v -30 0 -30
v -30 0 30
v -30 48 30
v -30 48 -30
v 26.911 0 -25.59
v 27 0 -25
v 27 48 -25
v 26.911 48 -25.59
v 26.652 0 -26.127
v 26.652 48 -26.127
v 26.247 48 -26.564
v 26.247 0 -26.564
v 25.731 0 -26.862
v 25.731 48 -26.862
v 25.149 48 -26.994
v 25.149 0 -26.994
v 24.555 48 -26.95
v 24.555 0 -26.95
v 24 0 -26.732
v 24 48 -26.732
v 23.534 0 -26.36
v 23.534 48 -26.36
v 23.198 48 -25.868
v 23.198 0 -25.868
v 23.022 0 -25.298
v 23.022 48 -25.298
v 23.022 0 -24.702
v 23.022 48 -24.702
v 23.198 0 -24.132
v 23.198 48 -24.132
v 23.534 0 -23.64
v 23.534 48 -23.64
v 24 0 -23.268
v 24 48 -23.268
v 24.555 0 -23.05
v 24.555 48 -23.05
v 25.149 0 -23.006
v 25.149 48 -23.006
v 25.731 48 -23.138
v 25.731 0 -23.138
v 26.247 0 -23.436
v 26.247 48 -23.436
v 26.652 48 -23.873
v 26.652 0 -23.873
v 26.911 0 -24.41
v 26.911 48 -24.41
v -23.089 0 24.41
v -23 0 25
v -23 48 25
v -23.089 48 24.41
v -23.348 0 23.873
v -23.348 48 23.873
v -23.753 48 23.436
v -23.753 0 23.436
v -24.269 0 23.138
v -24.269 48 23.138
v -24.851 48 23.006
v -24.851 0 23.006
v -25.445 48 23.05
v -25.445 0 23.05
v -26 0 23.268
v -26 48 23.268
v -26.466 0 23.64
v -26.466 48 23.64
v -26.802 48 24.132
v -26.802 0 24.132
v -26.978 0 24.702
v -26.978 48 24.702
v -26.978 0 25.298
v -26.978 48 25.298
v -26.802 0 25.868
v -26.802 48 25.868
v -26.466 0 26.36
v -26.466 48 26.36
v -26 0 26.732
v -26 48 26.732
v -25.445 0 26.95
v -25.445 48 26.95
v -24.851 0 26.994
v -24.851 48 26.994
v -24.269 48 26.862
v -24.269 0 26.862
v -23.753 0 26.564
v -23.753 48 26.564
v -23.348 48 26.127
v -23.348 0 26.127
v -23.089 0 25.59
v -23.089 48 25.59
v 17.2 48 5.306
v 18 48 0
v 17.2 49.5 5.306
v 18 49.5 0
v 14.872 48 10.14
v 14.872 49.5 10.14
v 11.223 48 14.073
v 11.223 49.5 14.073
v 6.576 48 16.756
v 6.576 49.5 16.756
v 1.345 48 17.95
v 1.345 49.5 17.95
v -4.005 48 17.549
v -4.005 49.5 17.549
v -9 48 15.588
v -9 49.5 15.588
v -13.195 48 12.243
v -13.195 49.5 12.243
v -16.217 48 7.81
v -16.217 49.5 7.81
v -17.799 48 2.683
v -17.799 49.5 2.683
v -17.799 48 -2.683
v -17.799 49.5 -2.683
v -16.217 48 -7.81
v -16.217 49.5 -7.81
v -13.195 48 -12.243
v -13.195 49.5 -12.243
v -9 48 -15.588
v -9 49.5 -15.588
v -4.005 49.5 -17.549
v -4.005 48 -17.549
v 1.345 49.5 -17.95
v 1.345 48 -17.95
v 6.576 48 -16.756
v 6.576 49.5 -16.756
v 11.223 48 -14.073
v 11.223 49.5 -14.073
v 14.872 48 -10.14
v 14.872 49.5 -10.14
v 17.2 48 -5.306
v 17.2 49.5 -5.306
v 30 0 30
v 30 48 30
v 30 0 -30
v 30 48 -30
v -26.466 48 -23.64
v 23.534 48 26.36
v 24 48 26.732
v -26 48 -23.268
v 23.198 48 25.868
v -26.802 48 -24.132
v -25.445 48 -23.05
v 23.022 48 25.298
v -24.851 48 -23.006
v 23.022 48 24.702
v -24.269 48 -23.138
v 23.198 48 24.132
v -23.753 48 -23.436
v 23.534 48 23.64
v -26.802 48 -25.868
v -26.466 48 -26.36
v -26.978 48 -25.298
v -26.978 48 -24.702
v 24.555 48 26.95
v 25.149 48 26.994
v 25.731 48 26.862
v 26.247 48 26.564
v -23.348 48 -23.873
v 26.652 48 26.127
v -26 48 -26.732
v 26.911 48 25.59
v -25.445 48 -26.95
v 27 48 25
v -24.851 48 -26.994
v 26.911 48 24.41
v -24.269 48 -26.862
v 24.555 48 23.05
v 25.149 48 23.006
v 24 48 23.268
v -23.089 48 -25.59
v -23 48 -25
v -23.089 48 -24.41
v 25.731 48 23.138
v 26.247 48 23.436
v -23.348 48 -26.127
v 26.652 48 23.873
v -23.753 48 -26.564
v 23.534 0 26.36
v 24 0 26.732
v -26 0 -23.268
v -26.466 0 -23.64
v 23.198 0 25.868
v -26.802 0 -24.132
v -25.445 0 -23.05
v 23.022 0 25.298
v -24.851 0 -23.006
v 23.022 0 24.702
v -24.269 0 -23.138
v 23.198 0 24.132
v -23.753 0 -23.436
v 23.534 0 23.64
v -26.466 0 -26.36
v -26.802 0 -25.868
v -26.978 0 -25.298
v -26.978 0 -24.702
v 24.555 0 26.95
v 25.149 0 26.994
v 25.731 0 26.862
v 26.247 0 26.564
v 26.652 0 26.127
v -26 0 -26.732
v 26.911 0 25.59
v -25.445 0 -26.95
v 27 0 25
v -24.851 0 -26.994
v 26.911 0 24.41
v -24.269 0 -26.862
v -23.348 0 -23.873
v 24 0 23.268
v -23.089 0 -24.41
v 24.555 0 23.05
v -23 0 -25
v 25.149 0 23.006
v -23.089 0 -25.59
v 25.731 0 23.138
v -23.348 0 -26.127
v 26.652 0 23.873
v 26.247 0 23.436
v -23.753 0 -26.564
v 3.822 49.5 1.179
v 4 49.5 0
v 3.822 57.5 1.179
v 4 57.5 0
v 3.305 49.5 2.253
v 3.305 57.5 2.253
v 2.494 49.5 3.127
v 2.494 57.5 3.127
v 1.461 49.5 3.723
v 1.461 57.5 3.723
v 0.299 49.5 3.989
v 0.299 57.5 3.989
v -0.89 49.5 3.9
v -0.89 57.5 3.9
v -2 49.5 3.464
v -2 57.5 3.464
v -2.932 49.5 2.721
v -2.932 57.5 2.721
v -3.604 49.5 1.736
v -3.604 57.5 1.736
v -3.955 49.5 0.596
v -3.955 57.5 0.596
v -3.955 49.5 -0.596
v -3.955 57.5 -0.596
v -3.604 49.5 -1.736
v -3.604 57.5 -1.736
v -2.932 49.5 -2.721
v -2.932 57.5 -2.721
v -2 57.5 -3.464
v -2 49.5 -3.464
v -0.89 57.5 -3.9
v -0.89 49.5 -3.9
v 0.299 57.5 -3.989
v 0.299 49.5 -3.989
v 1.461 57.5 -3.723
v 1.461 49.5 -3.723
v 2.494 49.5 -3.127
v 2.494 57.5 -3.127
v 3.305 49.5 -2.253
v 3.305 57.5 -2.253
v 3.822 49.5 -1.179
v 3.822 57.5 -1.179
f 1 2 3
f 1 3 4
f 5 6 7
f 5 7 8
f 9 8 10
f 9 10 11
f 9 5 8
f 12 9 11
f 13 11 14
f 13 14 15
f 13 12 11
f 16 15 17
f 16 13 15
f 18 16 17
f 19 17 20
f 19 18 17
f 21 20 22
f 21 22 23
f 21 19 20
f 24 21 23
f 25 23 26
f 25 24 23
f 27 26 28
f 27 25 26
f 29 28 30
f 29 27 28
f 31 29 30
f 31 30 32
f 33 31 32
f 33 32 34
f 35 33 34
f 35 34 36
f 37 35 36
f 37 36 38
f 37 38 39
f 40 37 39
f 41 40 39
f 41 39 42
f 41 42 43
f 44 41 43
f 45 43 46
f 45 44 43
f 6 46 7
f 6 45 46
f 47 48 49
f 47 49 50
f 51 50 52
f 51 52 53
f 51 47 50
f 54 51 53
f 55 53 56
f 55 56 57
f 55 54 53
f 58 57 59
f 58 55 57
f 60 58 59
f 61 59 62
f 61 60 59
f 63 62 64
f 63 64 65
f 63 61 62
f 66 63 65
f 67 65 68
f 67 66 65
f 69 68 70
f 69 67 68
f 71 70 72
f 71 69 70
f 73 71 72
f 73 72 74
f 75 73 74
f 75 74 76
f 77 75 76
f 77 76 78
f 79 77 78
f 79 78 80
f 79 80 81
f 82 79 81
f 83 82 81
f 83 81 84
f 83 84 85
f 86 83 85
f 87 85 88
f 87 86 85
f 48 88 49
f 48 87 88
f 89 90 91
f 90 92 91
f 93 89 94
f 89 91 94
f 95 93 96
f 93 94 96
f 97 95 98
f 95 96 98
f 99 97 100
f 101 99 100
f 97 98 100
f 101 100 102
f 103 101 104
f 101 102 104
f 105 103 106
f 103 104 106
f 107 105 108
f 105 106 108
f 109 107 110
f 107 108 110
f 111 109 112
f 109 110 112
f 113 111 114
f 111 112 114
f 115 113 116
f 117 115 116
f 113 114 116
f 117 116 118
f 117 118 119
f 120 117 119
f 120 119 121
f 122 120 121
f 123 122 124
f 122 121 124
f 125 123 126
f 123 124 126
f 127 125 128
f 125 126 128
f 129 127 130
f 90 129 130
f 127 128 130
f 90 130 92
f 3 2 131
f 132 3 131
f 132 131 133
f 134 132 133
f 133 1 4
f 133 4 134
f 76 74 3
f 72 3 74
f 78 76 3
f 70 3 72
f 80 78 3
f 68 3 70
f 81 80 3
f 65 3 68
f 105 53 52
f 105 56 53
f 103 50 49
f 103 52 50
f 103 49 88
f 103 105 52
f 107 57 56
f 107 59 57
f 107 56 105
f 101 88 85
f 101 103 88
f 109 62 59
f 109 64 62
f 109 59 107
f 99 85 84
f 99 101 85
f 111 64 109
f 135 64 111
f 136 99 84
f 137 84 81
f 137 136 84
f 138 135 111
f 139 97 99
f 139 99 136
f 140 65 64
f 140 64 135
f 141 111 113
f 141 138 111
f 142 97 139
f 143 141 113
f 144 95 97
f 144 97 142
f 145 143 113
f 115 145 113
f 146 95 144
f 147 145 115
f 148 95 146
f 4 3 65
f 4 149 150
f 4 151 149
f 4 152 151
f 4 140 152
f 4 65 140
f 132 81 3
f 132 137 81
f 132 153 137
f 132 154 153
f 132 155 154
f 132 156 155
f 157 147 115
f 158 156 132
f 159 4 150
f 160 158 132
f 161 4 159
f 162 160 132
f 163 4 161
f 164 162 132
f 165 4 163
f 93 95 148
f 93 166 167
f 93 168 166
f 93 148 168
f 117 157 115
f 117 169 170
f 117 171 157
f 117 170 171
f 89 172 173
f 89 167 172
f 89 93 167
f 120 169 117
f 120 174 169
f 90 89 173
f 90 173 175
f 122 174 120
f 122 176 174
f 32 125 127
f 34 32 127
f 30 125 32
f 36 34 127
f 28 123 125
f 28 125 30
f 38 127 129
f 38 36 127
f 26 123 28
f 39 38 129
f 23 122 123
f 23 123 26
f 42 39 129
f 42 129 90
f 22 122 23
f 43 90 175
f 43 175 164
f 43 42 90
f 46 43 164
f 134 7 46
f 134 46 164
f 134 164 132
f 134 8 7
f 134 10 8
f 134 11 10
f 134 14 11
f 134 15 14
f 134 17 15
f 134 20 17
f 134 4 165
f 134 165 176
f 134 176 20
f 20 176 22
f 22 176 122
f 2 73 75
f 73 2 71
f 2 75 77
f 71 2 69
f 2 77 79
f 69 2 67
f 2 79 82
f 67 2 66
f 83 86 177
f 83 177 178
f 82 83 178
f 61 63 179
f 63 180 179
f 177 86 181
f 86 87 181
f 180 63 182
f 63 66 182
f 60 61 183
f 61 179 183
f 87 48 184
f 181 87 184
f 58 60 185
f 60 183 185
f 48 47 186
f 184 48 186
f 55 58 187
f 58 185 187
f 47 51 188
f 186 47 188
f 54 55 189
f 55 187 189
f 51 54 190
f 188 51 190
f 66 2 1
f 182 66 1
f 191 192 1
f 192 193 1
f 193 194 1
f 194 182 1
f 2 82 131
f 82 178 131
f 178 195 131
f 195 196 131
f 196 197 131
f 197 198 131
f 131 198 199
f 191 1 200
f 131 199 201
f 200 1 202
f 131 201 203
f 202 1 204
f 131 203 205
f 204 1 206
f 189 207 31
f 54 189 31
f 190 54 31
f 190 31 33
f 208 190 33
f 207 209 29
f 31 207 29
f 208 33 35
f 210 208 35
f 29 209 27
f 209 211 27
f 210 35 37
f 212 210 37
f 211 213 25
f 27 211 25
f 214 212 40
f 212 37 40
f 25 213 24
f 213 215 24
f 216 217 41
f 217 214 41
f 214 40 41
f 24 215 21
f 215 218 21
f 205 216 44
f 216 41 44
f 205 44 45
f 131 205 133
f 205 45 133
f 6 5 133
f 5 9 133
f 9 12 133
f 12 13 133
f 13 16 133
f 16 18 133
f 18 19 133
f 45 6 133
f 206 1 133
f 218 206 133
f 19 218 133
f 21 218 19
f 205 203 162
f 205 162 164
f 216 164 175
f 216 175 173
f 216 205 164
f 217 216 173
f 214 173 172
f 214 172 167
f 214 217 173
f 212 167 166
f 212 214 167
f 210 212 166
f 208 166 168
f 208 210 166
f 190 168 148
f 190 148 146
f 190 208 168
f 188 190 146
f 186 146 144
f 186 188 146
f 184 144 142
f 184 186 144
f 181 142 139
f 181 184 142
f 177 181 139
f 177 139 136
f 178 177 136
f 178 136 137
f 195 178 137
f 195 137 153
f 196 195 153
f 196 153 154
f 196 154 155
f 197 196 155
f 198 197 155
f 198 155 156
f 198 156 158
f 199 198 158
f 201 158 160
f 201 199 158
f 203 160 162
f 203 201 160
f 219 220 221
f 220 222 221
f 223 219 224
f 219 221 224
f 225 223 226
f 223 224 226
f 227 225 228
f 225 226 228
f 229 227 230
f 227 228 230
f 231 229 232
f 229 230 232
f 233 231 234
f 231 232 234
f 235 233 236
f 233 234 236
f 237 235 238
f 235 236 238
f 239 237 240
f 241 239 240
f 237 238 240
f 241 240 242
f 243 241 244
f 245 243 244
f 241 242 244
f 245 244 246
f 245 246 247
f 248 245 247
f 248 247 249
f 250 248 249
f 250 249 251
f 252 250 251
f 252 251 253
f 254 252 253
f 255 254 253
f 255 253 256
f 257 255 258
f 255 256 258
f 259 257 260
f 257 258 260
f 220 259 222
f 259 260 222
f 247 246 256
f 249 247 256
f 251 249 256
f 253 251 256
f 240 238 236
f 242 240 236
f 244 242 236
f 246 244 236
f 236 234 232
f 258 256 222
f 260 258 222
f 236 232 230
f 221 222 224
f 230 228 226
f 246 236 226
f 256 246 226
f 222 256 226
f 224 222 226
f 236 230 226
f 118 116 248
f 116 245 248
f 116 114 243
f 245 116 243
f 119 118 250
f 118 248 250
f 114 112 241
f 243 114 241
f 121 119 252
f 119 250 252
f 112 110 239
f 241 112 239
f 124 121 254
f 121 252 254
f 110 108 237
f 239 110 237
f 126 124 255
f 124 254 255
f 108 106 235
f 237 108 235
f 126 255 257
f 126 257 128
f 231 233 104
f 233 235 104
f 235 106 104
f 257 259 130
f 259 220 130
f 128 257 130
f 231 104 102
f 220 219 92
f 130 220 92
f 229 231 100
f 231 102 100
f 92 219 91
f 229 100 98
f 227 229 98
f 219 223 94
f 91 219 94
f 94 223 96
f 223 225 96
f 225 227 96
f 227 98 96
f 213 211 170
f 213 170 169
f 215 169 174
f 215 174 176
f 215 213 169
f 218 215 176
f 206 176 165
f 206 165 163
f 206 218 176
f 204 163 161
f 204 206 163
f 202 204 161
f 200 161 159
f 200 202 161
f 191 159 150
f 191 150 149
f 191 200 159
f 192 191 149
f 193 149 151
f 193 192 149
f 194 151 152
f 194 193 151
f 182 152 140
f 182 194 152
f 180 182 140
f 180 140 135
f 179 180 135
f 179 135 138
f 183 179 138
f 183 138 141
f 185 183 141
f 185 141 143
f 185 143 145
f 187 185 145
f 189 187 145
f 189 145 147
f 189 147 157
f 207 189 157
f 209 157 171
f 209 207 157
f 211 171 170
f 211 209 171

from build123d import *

# Parameters (mm, degrees)
SKETCH1_W           = 60
SKETCH1_H           = 60
SKETCH1_R           = 2
BOSS_EXTRUDE1_DEPTH = 48


with BuildPart() as part:
    # Sketch1 → Boss-Extrude1 (new body)
    with BuildSketch(Plane(origin=(0, 0, 0), x_dir=(1, 0, 0), z_dir=(0, 1, 0))):
        Rectangle(SKETCH1_W, SKETCH1_H)
        with Locations((-25, 25)):
            Circle(SKETCH1_R, mode=Mode.SUBTRACT)
        with Locations((25, 25)):
            Circle(SKETCH1_R, mode=Mode.SUBTRACT)
        with Locations((25, -25)):
            Circle(SKETCH1_R, mode=Mode.SUBTRACT)
        with Locations((-25, -25)):
            Circle(SKETCH1_R, mode=Mode.SUBTRACT)
    extrude(amount=BOSS_EXTRUDE1_DEPTH)

    # Sketch3 → Revolve1 (revolve)
    with BuildSketch(Plane.XY):
        Polygon((0, 48), (18, 48), (18, 49.5), (4, 49.5), (4, 57.5), (0, 57.5), align=None)
    revolve(axis=Axis((0, 57.5, 0), (0, -1, 0)))


solid = part.part
